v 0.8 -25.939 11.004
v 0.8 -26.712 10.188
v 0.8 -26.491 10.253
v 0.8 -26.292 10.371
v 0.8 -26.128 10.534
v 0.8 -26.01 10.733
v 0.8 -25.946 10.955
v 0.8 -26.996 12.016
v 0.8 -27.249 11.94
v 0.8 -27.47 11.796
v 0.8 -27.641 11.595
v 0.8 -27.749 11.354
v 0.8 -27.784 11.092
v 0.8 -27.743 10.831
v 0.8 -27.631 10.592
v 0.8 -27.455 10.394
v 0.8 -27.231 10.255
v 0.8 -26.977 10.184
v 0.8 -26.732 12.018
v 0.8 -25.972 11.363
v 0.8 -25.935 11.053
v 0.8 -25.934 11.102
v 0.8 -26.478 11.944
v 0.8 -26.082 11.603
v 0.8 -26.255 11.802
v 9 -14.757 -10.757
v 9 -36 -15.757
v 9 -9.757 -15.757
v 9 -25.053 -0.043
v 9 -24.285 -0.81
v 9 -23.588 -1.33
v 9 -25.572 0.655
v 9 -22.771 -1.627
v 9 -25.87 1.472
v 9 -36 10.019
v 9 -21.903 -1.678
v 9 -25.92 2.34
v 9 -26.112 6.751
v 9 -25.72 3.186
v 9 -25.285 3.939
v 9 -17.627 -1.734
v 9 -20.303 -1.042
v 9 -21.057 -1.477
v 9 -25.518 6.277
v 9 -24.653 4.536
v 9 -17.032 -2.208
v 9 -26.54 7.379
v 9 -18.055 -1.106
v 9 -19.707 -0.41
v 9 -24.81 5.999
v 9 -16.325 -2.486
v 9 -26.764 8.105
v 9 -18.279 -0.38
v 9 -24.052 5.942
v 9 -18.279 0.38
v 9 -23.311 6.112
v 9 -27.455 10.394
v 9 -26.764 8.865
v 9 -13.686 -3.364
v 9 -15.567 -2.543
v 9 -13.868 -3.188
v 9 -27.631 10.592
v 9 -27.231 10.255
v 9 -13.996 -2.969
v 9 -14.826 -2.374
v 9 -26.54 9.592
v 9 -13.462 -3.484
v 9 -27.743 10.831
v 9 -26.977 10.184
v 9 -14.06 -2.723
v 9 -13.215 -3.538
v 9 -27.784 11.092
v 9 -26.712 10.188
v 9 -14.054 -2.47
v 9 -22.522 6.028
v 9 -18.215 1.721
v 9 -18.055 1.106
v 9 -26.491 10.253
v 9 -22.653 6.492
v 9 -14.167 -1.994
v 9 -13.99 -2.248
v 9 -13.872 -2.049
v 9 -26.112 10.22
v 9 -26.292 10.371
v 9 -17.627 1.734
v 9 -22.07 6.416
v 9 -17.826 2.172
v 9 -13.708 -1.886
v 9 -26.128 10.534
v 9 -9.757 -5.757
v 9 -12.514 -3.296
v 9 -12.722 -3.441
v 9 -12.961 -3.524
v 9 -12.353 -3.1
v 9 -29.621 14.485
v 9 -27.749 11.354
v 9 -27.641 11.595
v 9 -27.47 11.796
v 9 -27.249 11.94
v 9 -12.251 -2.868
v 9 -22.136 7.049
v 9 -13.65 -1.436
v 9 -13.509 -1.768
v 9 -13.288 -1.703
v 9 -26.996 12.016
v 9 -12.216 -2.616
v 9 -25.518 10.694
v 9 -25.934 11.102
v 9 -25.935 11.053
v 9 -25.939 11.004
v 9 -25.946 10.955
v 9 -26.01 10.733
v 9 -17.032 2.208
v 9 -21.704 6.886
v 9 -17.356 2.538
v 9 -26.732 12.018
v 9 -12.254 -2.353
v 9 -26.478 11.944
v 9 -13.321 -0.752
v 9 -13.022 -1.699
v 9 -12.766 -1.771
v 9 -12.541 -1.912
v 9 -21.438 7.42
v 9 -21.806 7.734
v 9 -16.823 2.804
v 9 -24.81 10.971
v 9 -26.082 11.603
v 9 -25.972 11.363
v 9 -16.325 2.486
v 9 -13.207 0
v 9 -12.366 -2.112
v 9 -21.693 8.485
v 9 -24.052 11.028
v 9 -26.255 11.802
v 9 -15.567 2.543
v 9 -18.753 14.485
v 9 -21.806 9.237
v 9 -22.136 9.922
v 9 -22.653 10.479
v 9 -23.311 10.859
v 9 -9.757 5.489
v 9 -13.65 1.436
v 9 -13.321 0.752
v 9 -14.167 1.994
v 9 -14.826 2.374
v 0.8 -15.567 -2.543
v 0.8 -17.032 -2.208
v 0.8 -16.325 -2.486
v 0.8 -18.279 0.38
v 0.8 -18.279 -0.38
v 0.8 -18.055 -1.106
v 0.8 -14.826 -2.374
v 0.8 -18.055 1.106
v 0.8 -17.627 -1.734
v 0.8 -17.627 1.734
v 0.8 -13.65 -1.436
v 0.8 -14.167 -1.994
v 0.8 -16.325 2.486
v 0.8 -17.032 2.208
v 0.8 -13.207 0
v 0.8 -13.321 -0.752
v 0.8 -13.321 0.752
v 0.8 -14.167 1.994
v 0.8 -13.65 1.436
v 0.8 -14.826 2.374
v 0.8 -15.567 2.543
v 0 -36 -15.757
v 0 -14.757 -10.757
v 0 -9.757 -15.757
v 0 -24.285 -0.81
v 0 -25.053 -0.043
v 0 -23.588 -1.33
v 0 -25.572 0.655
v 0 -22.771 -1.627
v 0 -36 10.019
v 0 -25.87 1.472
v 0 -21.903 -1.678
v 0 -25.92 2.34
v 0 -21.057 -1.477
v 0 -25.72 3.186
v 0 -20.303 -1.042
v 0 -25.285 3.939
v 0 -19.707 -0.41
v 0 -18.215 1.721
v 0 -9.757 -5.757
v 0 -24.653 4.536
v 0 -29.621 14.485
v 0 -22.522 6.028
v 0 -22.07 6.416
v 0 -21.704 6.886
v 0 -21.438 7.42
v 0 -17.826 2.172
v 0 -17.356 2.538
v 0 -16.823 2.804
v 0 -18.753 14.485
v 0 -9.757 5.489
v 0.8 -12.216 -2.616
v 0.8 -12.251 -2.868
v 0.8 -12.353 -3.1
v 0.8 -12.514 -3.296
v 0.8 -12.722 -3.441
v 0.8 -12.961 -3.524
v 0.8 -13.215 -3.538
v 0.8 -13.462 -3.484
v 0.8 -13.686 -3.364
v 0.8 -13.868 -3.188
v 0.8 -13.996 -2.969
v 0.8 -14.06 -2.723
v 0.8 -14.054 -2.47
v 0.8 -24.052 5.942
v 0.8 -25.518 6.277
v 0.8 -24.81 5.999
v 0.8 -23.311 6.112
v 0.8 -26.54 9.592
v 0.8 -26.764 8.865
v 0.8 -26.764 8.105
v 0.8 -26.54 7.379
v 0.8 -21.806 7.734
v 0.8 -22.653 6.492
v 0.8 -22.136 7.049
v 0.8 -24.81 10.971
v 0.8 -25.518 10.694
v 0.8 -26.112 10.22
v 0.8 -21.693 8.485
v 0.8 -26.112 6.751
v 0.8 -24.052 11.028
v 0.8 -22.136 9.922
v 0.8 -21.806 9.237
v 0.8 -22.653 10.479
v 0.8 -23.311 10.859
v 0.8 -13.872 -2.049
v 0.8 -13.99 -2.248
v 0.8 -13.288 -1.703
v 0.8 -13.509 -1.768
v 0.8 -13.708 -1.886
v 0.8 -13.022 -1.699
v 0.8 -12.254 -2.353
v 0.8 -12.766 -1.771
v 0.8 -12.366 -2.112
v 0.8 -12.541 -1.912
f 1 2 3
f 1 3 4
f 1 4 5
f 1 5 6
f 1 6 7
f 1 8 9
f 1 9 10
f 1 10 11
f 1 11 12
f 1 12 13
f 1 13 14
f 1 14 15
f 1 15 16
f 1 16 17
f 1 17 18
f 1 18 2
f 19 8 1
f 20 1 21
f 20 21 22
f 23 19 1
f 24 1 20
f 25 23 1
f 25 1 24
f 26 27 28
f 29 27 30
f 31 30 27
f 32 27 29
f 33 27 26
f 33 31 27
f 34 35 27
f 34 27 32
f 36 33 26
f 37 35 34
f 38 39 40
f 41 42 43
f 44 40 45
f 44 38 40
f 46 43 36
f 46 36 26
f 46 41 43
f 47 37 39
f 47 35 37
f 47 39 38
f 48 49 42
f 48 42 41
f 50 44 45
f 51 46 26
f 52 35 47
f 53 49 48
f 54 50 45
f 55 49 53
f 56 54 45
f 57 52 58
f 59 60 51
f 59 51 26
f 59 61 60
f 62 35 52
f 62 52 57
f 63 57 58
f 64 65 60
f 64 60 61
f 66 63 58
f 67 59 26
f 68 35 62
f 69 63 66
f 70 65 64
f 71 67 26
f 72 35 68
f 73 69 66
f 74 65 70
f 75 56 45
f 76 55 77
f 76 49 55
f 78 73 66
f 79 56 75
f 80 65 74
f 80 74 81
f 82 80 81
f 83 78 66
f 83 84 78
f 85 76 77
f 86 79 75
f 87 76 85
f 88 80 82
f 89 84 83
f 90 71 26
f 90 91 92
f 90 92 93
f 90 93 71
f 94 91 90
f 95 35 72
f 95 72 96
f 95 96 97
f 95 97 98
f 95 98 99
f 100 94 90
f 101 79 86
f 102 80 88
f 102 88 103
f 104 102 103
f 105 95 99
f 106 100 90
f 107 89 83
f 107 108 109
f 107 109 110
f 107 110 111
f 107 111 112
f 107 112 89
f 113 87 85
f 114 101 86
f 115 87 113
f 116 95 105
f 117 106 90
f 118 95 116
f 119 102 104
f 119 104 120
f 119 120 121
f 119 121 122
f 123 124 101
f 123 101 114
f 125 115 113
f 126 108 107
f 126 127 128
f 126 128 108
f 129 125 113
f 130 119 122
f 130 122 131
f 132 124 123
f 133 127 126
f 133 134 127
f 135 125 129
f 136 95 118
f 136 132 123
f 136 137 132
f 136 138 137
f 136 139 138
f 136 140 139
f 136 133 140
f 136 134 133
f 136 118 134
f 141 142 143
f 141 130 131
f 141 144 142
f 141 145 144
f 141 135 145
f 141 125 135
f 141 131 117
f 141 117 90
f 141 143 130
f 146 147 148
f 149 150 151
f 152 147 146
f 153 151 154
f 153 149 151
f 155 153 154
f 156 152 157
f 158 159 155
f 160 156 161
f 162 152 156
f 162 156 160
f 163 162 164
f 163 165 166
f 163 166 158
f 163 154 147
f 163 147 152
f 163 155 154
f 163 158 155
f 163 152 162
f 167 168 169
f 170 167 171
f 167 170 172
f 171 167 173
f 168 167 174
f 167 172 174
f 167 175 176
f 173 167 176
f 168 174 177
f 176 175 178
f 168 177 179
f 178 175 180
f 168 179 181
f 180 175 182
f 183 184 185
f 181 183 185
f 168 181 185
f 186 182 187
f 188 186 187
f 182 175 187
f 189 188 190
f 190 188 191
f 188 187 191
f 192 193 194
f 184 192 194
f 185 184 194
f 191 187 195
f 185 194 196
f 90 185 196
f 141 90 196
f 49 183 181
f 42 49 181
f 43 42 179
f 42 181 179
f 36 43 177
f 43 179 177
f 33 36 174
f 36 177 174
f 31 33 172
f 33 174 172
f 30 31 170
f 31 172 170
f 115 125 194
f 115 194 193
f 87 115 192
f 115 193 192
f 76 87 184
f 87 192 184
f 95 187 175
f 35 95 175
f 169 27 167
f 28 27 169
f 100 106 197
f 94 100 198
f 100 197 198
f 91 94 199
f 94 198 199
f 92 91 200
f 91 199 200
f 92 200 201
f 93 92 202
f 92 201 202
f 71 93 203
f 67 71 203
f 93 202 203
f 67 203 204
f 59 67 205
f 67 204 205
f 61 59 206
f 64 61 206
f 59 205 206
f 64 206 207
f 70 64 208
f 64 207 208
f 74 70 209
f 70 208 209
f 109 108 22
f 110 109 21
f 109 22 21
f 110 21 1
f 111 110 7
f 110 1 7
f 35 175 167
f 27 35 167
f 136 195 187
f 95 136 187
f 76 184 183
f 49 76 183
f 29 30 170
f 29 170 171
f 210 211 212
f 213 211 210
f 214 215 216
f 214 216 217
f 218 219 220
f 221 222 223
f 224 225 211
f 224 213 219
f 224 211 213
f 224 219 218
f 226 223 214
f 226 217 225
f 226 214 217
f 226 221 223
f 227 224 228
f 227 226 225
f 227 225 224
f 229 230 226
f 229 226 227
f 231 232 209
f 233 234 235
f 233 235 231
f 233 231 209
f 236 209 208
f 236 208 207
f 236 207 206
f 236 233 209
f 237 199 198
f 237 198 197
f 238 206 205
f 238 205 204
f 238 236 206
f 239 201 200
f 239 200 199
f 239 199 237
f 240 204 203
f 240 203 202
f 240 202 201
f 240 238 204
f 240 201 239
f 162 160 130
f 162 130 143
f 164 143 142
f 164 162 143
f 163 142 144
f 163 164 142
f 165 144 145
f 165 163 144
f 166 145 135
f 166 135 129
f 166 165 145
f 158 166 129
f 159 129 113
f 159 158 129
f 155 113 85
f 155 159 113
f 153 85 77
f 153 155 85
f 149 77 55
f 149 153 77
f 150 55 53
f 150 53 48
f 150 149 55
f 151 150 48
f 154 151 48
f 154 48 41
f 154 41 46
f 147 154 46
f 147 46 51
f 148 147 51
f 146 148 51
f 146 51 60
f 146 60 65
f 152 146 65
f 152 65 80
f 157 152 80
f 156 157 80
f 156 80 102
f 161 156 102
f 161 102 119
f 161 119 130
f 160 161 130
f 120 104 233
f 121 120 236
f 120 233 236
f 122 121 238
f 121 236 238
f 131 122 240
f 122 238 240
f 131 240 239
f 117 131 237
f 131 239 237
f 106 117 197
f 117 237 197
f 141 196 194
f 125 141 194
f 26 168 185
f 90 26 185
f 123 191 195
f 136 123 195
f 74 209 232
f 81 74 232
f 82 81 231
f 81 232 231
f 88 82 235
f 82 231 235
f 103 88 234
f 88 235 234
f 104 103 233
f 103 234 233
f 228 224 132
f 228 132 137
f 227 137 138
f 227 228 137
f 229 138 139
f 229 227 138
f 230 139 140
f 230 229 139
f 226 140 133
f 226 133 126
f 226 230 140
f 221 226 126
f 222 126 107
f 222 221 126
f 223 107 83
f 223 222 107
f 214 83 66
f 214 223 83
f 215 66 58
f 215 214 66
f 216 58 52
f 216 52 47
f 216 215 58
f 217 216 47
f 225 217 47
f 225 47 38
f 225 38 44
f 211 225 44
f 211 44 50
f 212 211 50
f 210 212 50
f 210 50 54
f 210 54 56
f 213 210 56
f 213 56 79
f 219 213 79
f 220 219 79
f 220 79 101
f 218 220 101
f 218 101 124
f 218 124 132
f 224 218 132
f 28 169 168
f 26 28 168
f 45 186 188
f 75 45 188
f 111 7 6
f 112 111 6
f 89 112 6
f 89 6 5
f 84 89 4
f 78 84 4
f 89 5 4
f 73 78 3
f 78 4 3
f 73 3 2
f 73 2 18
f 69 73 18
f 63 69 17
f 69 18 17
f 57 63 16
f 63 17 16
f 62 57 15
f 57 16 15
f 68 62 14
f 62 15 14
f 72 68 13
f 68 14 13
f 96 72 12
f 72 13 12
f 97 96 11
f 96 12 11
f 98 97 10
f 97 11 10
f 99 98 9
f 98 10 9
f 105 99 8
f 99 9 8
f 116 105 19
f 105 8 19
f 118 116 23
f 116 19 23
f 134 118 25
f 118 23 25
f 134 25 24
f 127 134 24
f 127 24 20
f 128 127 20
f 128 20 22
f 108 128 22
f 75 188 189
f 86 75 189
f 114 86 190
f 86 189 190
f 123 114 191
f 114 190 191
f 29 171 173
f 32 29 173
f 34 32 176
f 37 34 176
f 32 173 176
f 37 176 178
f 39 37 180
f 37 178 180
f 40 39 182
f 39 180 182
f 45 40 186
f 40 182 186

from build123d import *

# Parameters (mm, degrees)
F0_R     = 2.55
F1_DEPTH = 9
F2_DEPTH = 0.8
F4_DEPTH = 9
F7_DEPTH = 9


with BuildPart() as f1:
    # F0 (on Right) → F1 (new body)
    with BuildSketch(Plane.YZ):
        with BuildLine():
            ThreePointArc((-26.7124370169, 10.1882511594), (-26.3563013281, 6.3563288866), (-22.5219113781, 6.0278252414))
            ThreePointArc((-22.5219113781, 6.0278252414), (-21.875519954, 6.6422568398), (-21.4383157397, 7.4195602151))
            ThreePointArc((-21.4383157397, 7.4195602151), (-21.2919649304, 7.9435133623), (-21.2426406871, 8.4852813742))
            ThreePointArc((-21.2426406871, 8.4852813742), (-22.8478126252, 11.1413037156), (-25.9456104723, 10.9550777041))
            ThreePointArc((-25.9456104723, 10.9550777041), (-26.2048620049, 10.447502692), (-26.7124370169, 10.1882511594))
        make_face()
        with Locations((-24.2426406871, 8.4852813742)):
            Circle(F0_R, mode=Mode.SUBTRACT)
        with BuildLine():
            Line((-24.6525061657, 4.5359667102), (-22.5219113781, 6.0278252414))
            ThreePointArc((-22.5219113781, 6.0278252414), (-26.3563013281, 6.3563288866), (-26.7124370169, 10.1882511594))
            ThreePointArc((-26.7124370169, 10.1882511594), (-27.5629018113, 11.7016238155), (-25.9339357775, 11.1015764646))
            ThreePointArc((-25.9339357775, 11.1015764646), (-25.9368590705, 11.0280948592), (-25.9456104723, 10.9550777041))
            ThreePointArc((-25.9456104723, 10.9550777041), (-22.8478126252, 11.1413037156), (-21.2426406871, 8.4852813742))
            ThreePointArc((-21.2426406871, 8.4852813742), (-21.2919649304, 7.9435133623), (-21.4383157397, 7.4195602151))
            Line((-21.4383157397, 7.4195602151), (-18.7531459804, 14.4852813742))
            Line((-18.7531459804, 14.4852813742), (-29.6213270116, 14.4852813742))
            Line((-29.6213270116, 14.4852813742), (-36, 10.018886464))
            Line((-36, 10.018886464), (-36, -5.7573593129))
            Line((-36, -5.7573593129), (-20, -5.7573593129))
            Line((-20, -5.7573593129), (-9.7573593129, -5.7573593129))
            Line((-9.7573593129, -5.7573593129), (-9.7573593129, -5.3786863245))
            Line((-9.7573593129, -5.3786863245), (-9.7573593129, 5.4894947067))
            Line((-9.7573593129, 5.4894947067), (-16.823080472, 2.8043249475))
            ThreePointArc((-16.823080472, 2.8043249475), (-14.0540043113, 2.4695306718), (-12.7573593129, 0))
            ThreePointArc((-12.7573593129, 0), (-12.8929755232, -0.8917990274), (-13.2875629831, -1.7029697852))
            ThreePointArc((-13.2875629831, -1.7029697852), (-12.5410168717, -1.9123290566), (-12.2160642225, -2.6162950904))
            ThreePointArc((-12.2160642225, -2.6162950904), (-13.2145458279, -3.5383717974), (-14.0543895277, -2.4697963298))
            ThreePointArc((-14.0543895277, -2.4697963298), (-17.8863118005, -2.113660641), (-18.2148154457, 1.7207293091))
            Line((-18.2148154457, 1.7207293091), (-19.7066739769, -0.4098654786))
            ThreePointArc((-19.7066739769, -0.4098654786), (-21.9026628816, -1.6777202638), (-24.2854504534, -0.8104565131))
            Line((-24.2854504534, -0.8104565131), (-25.0530972002, -0.0428097662))
            ThreePointArc((-25.0530972002, -0.0428097662), (-25.9203609509, 2.3399778056), (-24.6525061657, 4.5359667102))
        make_face()
        with BuildLine():
            ThreePointArc((-16.823080472, 2.8043249475), (-17.6003838473, 2.3671207332), (-18.2148154457, 1.7207293091))
            ThreePointArc((-18.2148154457, 1.7207293091), (-17.8863118005, -2.113660641), (-14.0543895277, -2.4697963298))
            ThreePointArc((-14.0543895277, -2.4697963298), (-13.7951379951, -1.9622213178), (-13.2875629831, -1.7029697852))
            ThreePointArc((-13.2875629831, -1.7029697852), (-12.8929755232, -0.8917990274), (-12.7573593129, 0))
            ThreePointArc((-12.7573593129, 0), (-14.0540043113, 2.4695306718), (-16.823080472, 2.8043249475))
        make_face()
        with Locations((-15.7573593129, 0)):
            Circle(F0_R, mode=Mode.SUBTRACT)
    extrude(amount=F1_DEPTH)

    # F0 (on Right) → F2 (join)
    with BuildSketch(Plane.YZ):
        with Locations((-15.7573593129, 0)):
            Circle(F0_R)
        with Locations((-24.2426406871, 8.4852813742)):
            Circle(F0_R)
        with BuildLine():
            ThreePointArc((-25.9456104723, 10.9550777041), (-26.3639610307, 10.6066017178), (-26.7124370169, 10.1882511594))
            ThreePointArc((-26.7124370169, 10.1882511594), (-26.2048620049, 10.447502692), (-25.9456104723, 10.9550777041))
        make_face()
        with BuildLine():
            ThreePointArc((-25.9339357775, 11.1015764646), (-27.5629018113, 11.7016238155), (-26.7124370169, 10.1882511594))
            ThreePointArc((-26.7124370169, 10.1882511594), (-26.3639610307, 10.6066017178), (-25.9456104723, 10.9550777041))
            ThreePointArc((-25.9456104723, 10.9550777041), (-25.9368590705, 11.0280948592), (-25.9339357775, 11.1015764646))
        make_face()
        with BuildLine():
            ThreePointArc((-13.2875629831, -1.7029697852), (-13.7951379951, -1.9622213178), (-14.0543895277, -2.4697963298))
            ThreePointArc((-14.0543895277, -2.4697963298), (-13.6360389693, -2.1213203436), (-13.2875629831, -1.7029697852))
        make_face()
        with BuildLine():
            ThreePointArc((-13.2875629831, -1.7029697852), (-13.6360389693, -2.1213203436), (-14.0543895277, -2.4697963298))
            ThreePointArc((-14.0543895277, -2.4697963298), (-13.2145458279, -3.5383717974), (-12.2160642225, -2.6162950904))
            ThreePointArc((-12.2160642225, -2.6162950904), (-12.5410168717, -1.9123290566), (-13.2875629831, -1.7029697852))
        make_face()
    extrude(amount=F2_DEPTH)

    # F3 (on face) → F4 (join, through all)
    with BuildSketch(Plane.YZ):
        Polygon((-20, -5.7573593129), (-36, -5.7573593129), (-36, -15.7573593129), (-19.7573593129, -15.7573593129), (-9.7573593129, -5.7573593129), align=None)
    extrude(amount=F4_DEPTH)

    # F6 (on face) → F7 (join, through all)
    with BuildSketch(Plane.YZ.offset(9)):
        Polygon((-9.7573593129, -15.7573593129), (-14.7573593129, -10.7573593129), (-19.7573593129, -15.7573593129), align=None)
    extrude(amount=-F7_DEPTH)


solid = f1.part
